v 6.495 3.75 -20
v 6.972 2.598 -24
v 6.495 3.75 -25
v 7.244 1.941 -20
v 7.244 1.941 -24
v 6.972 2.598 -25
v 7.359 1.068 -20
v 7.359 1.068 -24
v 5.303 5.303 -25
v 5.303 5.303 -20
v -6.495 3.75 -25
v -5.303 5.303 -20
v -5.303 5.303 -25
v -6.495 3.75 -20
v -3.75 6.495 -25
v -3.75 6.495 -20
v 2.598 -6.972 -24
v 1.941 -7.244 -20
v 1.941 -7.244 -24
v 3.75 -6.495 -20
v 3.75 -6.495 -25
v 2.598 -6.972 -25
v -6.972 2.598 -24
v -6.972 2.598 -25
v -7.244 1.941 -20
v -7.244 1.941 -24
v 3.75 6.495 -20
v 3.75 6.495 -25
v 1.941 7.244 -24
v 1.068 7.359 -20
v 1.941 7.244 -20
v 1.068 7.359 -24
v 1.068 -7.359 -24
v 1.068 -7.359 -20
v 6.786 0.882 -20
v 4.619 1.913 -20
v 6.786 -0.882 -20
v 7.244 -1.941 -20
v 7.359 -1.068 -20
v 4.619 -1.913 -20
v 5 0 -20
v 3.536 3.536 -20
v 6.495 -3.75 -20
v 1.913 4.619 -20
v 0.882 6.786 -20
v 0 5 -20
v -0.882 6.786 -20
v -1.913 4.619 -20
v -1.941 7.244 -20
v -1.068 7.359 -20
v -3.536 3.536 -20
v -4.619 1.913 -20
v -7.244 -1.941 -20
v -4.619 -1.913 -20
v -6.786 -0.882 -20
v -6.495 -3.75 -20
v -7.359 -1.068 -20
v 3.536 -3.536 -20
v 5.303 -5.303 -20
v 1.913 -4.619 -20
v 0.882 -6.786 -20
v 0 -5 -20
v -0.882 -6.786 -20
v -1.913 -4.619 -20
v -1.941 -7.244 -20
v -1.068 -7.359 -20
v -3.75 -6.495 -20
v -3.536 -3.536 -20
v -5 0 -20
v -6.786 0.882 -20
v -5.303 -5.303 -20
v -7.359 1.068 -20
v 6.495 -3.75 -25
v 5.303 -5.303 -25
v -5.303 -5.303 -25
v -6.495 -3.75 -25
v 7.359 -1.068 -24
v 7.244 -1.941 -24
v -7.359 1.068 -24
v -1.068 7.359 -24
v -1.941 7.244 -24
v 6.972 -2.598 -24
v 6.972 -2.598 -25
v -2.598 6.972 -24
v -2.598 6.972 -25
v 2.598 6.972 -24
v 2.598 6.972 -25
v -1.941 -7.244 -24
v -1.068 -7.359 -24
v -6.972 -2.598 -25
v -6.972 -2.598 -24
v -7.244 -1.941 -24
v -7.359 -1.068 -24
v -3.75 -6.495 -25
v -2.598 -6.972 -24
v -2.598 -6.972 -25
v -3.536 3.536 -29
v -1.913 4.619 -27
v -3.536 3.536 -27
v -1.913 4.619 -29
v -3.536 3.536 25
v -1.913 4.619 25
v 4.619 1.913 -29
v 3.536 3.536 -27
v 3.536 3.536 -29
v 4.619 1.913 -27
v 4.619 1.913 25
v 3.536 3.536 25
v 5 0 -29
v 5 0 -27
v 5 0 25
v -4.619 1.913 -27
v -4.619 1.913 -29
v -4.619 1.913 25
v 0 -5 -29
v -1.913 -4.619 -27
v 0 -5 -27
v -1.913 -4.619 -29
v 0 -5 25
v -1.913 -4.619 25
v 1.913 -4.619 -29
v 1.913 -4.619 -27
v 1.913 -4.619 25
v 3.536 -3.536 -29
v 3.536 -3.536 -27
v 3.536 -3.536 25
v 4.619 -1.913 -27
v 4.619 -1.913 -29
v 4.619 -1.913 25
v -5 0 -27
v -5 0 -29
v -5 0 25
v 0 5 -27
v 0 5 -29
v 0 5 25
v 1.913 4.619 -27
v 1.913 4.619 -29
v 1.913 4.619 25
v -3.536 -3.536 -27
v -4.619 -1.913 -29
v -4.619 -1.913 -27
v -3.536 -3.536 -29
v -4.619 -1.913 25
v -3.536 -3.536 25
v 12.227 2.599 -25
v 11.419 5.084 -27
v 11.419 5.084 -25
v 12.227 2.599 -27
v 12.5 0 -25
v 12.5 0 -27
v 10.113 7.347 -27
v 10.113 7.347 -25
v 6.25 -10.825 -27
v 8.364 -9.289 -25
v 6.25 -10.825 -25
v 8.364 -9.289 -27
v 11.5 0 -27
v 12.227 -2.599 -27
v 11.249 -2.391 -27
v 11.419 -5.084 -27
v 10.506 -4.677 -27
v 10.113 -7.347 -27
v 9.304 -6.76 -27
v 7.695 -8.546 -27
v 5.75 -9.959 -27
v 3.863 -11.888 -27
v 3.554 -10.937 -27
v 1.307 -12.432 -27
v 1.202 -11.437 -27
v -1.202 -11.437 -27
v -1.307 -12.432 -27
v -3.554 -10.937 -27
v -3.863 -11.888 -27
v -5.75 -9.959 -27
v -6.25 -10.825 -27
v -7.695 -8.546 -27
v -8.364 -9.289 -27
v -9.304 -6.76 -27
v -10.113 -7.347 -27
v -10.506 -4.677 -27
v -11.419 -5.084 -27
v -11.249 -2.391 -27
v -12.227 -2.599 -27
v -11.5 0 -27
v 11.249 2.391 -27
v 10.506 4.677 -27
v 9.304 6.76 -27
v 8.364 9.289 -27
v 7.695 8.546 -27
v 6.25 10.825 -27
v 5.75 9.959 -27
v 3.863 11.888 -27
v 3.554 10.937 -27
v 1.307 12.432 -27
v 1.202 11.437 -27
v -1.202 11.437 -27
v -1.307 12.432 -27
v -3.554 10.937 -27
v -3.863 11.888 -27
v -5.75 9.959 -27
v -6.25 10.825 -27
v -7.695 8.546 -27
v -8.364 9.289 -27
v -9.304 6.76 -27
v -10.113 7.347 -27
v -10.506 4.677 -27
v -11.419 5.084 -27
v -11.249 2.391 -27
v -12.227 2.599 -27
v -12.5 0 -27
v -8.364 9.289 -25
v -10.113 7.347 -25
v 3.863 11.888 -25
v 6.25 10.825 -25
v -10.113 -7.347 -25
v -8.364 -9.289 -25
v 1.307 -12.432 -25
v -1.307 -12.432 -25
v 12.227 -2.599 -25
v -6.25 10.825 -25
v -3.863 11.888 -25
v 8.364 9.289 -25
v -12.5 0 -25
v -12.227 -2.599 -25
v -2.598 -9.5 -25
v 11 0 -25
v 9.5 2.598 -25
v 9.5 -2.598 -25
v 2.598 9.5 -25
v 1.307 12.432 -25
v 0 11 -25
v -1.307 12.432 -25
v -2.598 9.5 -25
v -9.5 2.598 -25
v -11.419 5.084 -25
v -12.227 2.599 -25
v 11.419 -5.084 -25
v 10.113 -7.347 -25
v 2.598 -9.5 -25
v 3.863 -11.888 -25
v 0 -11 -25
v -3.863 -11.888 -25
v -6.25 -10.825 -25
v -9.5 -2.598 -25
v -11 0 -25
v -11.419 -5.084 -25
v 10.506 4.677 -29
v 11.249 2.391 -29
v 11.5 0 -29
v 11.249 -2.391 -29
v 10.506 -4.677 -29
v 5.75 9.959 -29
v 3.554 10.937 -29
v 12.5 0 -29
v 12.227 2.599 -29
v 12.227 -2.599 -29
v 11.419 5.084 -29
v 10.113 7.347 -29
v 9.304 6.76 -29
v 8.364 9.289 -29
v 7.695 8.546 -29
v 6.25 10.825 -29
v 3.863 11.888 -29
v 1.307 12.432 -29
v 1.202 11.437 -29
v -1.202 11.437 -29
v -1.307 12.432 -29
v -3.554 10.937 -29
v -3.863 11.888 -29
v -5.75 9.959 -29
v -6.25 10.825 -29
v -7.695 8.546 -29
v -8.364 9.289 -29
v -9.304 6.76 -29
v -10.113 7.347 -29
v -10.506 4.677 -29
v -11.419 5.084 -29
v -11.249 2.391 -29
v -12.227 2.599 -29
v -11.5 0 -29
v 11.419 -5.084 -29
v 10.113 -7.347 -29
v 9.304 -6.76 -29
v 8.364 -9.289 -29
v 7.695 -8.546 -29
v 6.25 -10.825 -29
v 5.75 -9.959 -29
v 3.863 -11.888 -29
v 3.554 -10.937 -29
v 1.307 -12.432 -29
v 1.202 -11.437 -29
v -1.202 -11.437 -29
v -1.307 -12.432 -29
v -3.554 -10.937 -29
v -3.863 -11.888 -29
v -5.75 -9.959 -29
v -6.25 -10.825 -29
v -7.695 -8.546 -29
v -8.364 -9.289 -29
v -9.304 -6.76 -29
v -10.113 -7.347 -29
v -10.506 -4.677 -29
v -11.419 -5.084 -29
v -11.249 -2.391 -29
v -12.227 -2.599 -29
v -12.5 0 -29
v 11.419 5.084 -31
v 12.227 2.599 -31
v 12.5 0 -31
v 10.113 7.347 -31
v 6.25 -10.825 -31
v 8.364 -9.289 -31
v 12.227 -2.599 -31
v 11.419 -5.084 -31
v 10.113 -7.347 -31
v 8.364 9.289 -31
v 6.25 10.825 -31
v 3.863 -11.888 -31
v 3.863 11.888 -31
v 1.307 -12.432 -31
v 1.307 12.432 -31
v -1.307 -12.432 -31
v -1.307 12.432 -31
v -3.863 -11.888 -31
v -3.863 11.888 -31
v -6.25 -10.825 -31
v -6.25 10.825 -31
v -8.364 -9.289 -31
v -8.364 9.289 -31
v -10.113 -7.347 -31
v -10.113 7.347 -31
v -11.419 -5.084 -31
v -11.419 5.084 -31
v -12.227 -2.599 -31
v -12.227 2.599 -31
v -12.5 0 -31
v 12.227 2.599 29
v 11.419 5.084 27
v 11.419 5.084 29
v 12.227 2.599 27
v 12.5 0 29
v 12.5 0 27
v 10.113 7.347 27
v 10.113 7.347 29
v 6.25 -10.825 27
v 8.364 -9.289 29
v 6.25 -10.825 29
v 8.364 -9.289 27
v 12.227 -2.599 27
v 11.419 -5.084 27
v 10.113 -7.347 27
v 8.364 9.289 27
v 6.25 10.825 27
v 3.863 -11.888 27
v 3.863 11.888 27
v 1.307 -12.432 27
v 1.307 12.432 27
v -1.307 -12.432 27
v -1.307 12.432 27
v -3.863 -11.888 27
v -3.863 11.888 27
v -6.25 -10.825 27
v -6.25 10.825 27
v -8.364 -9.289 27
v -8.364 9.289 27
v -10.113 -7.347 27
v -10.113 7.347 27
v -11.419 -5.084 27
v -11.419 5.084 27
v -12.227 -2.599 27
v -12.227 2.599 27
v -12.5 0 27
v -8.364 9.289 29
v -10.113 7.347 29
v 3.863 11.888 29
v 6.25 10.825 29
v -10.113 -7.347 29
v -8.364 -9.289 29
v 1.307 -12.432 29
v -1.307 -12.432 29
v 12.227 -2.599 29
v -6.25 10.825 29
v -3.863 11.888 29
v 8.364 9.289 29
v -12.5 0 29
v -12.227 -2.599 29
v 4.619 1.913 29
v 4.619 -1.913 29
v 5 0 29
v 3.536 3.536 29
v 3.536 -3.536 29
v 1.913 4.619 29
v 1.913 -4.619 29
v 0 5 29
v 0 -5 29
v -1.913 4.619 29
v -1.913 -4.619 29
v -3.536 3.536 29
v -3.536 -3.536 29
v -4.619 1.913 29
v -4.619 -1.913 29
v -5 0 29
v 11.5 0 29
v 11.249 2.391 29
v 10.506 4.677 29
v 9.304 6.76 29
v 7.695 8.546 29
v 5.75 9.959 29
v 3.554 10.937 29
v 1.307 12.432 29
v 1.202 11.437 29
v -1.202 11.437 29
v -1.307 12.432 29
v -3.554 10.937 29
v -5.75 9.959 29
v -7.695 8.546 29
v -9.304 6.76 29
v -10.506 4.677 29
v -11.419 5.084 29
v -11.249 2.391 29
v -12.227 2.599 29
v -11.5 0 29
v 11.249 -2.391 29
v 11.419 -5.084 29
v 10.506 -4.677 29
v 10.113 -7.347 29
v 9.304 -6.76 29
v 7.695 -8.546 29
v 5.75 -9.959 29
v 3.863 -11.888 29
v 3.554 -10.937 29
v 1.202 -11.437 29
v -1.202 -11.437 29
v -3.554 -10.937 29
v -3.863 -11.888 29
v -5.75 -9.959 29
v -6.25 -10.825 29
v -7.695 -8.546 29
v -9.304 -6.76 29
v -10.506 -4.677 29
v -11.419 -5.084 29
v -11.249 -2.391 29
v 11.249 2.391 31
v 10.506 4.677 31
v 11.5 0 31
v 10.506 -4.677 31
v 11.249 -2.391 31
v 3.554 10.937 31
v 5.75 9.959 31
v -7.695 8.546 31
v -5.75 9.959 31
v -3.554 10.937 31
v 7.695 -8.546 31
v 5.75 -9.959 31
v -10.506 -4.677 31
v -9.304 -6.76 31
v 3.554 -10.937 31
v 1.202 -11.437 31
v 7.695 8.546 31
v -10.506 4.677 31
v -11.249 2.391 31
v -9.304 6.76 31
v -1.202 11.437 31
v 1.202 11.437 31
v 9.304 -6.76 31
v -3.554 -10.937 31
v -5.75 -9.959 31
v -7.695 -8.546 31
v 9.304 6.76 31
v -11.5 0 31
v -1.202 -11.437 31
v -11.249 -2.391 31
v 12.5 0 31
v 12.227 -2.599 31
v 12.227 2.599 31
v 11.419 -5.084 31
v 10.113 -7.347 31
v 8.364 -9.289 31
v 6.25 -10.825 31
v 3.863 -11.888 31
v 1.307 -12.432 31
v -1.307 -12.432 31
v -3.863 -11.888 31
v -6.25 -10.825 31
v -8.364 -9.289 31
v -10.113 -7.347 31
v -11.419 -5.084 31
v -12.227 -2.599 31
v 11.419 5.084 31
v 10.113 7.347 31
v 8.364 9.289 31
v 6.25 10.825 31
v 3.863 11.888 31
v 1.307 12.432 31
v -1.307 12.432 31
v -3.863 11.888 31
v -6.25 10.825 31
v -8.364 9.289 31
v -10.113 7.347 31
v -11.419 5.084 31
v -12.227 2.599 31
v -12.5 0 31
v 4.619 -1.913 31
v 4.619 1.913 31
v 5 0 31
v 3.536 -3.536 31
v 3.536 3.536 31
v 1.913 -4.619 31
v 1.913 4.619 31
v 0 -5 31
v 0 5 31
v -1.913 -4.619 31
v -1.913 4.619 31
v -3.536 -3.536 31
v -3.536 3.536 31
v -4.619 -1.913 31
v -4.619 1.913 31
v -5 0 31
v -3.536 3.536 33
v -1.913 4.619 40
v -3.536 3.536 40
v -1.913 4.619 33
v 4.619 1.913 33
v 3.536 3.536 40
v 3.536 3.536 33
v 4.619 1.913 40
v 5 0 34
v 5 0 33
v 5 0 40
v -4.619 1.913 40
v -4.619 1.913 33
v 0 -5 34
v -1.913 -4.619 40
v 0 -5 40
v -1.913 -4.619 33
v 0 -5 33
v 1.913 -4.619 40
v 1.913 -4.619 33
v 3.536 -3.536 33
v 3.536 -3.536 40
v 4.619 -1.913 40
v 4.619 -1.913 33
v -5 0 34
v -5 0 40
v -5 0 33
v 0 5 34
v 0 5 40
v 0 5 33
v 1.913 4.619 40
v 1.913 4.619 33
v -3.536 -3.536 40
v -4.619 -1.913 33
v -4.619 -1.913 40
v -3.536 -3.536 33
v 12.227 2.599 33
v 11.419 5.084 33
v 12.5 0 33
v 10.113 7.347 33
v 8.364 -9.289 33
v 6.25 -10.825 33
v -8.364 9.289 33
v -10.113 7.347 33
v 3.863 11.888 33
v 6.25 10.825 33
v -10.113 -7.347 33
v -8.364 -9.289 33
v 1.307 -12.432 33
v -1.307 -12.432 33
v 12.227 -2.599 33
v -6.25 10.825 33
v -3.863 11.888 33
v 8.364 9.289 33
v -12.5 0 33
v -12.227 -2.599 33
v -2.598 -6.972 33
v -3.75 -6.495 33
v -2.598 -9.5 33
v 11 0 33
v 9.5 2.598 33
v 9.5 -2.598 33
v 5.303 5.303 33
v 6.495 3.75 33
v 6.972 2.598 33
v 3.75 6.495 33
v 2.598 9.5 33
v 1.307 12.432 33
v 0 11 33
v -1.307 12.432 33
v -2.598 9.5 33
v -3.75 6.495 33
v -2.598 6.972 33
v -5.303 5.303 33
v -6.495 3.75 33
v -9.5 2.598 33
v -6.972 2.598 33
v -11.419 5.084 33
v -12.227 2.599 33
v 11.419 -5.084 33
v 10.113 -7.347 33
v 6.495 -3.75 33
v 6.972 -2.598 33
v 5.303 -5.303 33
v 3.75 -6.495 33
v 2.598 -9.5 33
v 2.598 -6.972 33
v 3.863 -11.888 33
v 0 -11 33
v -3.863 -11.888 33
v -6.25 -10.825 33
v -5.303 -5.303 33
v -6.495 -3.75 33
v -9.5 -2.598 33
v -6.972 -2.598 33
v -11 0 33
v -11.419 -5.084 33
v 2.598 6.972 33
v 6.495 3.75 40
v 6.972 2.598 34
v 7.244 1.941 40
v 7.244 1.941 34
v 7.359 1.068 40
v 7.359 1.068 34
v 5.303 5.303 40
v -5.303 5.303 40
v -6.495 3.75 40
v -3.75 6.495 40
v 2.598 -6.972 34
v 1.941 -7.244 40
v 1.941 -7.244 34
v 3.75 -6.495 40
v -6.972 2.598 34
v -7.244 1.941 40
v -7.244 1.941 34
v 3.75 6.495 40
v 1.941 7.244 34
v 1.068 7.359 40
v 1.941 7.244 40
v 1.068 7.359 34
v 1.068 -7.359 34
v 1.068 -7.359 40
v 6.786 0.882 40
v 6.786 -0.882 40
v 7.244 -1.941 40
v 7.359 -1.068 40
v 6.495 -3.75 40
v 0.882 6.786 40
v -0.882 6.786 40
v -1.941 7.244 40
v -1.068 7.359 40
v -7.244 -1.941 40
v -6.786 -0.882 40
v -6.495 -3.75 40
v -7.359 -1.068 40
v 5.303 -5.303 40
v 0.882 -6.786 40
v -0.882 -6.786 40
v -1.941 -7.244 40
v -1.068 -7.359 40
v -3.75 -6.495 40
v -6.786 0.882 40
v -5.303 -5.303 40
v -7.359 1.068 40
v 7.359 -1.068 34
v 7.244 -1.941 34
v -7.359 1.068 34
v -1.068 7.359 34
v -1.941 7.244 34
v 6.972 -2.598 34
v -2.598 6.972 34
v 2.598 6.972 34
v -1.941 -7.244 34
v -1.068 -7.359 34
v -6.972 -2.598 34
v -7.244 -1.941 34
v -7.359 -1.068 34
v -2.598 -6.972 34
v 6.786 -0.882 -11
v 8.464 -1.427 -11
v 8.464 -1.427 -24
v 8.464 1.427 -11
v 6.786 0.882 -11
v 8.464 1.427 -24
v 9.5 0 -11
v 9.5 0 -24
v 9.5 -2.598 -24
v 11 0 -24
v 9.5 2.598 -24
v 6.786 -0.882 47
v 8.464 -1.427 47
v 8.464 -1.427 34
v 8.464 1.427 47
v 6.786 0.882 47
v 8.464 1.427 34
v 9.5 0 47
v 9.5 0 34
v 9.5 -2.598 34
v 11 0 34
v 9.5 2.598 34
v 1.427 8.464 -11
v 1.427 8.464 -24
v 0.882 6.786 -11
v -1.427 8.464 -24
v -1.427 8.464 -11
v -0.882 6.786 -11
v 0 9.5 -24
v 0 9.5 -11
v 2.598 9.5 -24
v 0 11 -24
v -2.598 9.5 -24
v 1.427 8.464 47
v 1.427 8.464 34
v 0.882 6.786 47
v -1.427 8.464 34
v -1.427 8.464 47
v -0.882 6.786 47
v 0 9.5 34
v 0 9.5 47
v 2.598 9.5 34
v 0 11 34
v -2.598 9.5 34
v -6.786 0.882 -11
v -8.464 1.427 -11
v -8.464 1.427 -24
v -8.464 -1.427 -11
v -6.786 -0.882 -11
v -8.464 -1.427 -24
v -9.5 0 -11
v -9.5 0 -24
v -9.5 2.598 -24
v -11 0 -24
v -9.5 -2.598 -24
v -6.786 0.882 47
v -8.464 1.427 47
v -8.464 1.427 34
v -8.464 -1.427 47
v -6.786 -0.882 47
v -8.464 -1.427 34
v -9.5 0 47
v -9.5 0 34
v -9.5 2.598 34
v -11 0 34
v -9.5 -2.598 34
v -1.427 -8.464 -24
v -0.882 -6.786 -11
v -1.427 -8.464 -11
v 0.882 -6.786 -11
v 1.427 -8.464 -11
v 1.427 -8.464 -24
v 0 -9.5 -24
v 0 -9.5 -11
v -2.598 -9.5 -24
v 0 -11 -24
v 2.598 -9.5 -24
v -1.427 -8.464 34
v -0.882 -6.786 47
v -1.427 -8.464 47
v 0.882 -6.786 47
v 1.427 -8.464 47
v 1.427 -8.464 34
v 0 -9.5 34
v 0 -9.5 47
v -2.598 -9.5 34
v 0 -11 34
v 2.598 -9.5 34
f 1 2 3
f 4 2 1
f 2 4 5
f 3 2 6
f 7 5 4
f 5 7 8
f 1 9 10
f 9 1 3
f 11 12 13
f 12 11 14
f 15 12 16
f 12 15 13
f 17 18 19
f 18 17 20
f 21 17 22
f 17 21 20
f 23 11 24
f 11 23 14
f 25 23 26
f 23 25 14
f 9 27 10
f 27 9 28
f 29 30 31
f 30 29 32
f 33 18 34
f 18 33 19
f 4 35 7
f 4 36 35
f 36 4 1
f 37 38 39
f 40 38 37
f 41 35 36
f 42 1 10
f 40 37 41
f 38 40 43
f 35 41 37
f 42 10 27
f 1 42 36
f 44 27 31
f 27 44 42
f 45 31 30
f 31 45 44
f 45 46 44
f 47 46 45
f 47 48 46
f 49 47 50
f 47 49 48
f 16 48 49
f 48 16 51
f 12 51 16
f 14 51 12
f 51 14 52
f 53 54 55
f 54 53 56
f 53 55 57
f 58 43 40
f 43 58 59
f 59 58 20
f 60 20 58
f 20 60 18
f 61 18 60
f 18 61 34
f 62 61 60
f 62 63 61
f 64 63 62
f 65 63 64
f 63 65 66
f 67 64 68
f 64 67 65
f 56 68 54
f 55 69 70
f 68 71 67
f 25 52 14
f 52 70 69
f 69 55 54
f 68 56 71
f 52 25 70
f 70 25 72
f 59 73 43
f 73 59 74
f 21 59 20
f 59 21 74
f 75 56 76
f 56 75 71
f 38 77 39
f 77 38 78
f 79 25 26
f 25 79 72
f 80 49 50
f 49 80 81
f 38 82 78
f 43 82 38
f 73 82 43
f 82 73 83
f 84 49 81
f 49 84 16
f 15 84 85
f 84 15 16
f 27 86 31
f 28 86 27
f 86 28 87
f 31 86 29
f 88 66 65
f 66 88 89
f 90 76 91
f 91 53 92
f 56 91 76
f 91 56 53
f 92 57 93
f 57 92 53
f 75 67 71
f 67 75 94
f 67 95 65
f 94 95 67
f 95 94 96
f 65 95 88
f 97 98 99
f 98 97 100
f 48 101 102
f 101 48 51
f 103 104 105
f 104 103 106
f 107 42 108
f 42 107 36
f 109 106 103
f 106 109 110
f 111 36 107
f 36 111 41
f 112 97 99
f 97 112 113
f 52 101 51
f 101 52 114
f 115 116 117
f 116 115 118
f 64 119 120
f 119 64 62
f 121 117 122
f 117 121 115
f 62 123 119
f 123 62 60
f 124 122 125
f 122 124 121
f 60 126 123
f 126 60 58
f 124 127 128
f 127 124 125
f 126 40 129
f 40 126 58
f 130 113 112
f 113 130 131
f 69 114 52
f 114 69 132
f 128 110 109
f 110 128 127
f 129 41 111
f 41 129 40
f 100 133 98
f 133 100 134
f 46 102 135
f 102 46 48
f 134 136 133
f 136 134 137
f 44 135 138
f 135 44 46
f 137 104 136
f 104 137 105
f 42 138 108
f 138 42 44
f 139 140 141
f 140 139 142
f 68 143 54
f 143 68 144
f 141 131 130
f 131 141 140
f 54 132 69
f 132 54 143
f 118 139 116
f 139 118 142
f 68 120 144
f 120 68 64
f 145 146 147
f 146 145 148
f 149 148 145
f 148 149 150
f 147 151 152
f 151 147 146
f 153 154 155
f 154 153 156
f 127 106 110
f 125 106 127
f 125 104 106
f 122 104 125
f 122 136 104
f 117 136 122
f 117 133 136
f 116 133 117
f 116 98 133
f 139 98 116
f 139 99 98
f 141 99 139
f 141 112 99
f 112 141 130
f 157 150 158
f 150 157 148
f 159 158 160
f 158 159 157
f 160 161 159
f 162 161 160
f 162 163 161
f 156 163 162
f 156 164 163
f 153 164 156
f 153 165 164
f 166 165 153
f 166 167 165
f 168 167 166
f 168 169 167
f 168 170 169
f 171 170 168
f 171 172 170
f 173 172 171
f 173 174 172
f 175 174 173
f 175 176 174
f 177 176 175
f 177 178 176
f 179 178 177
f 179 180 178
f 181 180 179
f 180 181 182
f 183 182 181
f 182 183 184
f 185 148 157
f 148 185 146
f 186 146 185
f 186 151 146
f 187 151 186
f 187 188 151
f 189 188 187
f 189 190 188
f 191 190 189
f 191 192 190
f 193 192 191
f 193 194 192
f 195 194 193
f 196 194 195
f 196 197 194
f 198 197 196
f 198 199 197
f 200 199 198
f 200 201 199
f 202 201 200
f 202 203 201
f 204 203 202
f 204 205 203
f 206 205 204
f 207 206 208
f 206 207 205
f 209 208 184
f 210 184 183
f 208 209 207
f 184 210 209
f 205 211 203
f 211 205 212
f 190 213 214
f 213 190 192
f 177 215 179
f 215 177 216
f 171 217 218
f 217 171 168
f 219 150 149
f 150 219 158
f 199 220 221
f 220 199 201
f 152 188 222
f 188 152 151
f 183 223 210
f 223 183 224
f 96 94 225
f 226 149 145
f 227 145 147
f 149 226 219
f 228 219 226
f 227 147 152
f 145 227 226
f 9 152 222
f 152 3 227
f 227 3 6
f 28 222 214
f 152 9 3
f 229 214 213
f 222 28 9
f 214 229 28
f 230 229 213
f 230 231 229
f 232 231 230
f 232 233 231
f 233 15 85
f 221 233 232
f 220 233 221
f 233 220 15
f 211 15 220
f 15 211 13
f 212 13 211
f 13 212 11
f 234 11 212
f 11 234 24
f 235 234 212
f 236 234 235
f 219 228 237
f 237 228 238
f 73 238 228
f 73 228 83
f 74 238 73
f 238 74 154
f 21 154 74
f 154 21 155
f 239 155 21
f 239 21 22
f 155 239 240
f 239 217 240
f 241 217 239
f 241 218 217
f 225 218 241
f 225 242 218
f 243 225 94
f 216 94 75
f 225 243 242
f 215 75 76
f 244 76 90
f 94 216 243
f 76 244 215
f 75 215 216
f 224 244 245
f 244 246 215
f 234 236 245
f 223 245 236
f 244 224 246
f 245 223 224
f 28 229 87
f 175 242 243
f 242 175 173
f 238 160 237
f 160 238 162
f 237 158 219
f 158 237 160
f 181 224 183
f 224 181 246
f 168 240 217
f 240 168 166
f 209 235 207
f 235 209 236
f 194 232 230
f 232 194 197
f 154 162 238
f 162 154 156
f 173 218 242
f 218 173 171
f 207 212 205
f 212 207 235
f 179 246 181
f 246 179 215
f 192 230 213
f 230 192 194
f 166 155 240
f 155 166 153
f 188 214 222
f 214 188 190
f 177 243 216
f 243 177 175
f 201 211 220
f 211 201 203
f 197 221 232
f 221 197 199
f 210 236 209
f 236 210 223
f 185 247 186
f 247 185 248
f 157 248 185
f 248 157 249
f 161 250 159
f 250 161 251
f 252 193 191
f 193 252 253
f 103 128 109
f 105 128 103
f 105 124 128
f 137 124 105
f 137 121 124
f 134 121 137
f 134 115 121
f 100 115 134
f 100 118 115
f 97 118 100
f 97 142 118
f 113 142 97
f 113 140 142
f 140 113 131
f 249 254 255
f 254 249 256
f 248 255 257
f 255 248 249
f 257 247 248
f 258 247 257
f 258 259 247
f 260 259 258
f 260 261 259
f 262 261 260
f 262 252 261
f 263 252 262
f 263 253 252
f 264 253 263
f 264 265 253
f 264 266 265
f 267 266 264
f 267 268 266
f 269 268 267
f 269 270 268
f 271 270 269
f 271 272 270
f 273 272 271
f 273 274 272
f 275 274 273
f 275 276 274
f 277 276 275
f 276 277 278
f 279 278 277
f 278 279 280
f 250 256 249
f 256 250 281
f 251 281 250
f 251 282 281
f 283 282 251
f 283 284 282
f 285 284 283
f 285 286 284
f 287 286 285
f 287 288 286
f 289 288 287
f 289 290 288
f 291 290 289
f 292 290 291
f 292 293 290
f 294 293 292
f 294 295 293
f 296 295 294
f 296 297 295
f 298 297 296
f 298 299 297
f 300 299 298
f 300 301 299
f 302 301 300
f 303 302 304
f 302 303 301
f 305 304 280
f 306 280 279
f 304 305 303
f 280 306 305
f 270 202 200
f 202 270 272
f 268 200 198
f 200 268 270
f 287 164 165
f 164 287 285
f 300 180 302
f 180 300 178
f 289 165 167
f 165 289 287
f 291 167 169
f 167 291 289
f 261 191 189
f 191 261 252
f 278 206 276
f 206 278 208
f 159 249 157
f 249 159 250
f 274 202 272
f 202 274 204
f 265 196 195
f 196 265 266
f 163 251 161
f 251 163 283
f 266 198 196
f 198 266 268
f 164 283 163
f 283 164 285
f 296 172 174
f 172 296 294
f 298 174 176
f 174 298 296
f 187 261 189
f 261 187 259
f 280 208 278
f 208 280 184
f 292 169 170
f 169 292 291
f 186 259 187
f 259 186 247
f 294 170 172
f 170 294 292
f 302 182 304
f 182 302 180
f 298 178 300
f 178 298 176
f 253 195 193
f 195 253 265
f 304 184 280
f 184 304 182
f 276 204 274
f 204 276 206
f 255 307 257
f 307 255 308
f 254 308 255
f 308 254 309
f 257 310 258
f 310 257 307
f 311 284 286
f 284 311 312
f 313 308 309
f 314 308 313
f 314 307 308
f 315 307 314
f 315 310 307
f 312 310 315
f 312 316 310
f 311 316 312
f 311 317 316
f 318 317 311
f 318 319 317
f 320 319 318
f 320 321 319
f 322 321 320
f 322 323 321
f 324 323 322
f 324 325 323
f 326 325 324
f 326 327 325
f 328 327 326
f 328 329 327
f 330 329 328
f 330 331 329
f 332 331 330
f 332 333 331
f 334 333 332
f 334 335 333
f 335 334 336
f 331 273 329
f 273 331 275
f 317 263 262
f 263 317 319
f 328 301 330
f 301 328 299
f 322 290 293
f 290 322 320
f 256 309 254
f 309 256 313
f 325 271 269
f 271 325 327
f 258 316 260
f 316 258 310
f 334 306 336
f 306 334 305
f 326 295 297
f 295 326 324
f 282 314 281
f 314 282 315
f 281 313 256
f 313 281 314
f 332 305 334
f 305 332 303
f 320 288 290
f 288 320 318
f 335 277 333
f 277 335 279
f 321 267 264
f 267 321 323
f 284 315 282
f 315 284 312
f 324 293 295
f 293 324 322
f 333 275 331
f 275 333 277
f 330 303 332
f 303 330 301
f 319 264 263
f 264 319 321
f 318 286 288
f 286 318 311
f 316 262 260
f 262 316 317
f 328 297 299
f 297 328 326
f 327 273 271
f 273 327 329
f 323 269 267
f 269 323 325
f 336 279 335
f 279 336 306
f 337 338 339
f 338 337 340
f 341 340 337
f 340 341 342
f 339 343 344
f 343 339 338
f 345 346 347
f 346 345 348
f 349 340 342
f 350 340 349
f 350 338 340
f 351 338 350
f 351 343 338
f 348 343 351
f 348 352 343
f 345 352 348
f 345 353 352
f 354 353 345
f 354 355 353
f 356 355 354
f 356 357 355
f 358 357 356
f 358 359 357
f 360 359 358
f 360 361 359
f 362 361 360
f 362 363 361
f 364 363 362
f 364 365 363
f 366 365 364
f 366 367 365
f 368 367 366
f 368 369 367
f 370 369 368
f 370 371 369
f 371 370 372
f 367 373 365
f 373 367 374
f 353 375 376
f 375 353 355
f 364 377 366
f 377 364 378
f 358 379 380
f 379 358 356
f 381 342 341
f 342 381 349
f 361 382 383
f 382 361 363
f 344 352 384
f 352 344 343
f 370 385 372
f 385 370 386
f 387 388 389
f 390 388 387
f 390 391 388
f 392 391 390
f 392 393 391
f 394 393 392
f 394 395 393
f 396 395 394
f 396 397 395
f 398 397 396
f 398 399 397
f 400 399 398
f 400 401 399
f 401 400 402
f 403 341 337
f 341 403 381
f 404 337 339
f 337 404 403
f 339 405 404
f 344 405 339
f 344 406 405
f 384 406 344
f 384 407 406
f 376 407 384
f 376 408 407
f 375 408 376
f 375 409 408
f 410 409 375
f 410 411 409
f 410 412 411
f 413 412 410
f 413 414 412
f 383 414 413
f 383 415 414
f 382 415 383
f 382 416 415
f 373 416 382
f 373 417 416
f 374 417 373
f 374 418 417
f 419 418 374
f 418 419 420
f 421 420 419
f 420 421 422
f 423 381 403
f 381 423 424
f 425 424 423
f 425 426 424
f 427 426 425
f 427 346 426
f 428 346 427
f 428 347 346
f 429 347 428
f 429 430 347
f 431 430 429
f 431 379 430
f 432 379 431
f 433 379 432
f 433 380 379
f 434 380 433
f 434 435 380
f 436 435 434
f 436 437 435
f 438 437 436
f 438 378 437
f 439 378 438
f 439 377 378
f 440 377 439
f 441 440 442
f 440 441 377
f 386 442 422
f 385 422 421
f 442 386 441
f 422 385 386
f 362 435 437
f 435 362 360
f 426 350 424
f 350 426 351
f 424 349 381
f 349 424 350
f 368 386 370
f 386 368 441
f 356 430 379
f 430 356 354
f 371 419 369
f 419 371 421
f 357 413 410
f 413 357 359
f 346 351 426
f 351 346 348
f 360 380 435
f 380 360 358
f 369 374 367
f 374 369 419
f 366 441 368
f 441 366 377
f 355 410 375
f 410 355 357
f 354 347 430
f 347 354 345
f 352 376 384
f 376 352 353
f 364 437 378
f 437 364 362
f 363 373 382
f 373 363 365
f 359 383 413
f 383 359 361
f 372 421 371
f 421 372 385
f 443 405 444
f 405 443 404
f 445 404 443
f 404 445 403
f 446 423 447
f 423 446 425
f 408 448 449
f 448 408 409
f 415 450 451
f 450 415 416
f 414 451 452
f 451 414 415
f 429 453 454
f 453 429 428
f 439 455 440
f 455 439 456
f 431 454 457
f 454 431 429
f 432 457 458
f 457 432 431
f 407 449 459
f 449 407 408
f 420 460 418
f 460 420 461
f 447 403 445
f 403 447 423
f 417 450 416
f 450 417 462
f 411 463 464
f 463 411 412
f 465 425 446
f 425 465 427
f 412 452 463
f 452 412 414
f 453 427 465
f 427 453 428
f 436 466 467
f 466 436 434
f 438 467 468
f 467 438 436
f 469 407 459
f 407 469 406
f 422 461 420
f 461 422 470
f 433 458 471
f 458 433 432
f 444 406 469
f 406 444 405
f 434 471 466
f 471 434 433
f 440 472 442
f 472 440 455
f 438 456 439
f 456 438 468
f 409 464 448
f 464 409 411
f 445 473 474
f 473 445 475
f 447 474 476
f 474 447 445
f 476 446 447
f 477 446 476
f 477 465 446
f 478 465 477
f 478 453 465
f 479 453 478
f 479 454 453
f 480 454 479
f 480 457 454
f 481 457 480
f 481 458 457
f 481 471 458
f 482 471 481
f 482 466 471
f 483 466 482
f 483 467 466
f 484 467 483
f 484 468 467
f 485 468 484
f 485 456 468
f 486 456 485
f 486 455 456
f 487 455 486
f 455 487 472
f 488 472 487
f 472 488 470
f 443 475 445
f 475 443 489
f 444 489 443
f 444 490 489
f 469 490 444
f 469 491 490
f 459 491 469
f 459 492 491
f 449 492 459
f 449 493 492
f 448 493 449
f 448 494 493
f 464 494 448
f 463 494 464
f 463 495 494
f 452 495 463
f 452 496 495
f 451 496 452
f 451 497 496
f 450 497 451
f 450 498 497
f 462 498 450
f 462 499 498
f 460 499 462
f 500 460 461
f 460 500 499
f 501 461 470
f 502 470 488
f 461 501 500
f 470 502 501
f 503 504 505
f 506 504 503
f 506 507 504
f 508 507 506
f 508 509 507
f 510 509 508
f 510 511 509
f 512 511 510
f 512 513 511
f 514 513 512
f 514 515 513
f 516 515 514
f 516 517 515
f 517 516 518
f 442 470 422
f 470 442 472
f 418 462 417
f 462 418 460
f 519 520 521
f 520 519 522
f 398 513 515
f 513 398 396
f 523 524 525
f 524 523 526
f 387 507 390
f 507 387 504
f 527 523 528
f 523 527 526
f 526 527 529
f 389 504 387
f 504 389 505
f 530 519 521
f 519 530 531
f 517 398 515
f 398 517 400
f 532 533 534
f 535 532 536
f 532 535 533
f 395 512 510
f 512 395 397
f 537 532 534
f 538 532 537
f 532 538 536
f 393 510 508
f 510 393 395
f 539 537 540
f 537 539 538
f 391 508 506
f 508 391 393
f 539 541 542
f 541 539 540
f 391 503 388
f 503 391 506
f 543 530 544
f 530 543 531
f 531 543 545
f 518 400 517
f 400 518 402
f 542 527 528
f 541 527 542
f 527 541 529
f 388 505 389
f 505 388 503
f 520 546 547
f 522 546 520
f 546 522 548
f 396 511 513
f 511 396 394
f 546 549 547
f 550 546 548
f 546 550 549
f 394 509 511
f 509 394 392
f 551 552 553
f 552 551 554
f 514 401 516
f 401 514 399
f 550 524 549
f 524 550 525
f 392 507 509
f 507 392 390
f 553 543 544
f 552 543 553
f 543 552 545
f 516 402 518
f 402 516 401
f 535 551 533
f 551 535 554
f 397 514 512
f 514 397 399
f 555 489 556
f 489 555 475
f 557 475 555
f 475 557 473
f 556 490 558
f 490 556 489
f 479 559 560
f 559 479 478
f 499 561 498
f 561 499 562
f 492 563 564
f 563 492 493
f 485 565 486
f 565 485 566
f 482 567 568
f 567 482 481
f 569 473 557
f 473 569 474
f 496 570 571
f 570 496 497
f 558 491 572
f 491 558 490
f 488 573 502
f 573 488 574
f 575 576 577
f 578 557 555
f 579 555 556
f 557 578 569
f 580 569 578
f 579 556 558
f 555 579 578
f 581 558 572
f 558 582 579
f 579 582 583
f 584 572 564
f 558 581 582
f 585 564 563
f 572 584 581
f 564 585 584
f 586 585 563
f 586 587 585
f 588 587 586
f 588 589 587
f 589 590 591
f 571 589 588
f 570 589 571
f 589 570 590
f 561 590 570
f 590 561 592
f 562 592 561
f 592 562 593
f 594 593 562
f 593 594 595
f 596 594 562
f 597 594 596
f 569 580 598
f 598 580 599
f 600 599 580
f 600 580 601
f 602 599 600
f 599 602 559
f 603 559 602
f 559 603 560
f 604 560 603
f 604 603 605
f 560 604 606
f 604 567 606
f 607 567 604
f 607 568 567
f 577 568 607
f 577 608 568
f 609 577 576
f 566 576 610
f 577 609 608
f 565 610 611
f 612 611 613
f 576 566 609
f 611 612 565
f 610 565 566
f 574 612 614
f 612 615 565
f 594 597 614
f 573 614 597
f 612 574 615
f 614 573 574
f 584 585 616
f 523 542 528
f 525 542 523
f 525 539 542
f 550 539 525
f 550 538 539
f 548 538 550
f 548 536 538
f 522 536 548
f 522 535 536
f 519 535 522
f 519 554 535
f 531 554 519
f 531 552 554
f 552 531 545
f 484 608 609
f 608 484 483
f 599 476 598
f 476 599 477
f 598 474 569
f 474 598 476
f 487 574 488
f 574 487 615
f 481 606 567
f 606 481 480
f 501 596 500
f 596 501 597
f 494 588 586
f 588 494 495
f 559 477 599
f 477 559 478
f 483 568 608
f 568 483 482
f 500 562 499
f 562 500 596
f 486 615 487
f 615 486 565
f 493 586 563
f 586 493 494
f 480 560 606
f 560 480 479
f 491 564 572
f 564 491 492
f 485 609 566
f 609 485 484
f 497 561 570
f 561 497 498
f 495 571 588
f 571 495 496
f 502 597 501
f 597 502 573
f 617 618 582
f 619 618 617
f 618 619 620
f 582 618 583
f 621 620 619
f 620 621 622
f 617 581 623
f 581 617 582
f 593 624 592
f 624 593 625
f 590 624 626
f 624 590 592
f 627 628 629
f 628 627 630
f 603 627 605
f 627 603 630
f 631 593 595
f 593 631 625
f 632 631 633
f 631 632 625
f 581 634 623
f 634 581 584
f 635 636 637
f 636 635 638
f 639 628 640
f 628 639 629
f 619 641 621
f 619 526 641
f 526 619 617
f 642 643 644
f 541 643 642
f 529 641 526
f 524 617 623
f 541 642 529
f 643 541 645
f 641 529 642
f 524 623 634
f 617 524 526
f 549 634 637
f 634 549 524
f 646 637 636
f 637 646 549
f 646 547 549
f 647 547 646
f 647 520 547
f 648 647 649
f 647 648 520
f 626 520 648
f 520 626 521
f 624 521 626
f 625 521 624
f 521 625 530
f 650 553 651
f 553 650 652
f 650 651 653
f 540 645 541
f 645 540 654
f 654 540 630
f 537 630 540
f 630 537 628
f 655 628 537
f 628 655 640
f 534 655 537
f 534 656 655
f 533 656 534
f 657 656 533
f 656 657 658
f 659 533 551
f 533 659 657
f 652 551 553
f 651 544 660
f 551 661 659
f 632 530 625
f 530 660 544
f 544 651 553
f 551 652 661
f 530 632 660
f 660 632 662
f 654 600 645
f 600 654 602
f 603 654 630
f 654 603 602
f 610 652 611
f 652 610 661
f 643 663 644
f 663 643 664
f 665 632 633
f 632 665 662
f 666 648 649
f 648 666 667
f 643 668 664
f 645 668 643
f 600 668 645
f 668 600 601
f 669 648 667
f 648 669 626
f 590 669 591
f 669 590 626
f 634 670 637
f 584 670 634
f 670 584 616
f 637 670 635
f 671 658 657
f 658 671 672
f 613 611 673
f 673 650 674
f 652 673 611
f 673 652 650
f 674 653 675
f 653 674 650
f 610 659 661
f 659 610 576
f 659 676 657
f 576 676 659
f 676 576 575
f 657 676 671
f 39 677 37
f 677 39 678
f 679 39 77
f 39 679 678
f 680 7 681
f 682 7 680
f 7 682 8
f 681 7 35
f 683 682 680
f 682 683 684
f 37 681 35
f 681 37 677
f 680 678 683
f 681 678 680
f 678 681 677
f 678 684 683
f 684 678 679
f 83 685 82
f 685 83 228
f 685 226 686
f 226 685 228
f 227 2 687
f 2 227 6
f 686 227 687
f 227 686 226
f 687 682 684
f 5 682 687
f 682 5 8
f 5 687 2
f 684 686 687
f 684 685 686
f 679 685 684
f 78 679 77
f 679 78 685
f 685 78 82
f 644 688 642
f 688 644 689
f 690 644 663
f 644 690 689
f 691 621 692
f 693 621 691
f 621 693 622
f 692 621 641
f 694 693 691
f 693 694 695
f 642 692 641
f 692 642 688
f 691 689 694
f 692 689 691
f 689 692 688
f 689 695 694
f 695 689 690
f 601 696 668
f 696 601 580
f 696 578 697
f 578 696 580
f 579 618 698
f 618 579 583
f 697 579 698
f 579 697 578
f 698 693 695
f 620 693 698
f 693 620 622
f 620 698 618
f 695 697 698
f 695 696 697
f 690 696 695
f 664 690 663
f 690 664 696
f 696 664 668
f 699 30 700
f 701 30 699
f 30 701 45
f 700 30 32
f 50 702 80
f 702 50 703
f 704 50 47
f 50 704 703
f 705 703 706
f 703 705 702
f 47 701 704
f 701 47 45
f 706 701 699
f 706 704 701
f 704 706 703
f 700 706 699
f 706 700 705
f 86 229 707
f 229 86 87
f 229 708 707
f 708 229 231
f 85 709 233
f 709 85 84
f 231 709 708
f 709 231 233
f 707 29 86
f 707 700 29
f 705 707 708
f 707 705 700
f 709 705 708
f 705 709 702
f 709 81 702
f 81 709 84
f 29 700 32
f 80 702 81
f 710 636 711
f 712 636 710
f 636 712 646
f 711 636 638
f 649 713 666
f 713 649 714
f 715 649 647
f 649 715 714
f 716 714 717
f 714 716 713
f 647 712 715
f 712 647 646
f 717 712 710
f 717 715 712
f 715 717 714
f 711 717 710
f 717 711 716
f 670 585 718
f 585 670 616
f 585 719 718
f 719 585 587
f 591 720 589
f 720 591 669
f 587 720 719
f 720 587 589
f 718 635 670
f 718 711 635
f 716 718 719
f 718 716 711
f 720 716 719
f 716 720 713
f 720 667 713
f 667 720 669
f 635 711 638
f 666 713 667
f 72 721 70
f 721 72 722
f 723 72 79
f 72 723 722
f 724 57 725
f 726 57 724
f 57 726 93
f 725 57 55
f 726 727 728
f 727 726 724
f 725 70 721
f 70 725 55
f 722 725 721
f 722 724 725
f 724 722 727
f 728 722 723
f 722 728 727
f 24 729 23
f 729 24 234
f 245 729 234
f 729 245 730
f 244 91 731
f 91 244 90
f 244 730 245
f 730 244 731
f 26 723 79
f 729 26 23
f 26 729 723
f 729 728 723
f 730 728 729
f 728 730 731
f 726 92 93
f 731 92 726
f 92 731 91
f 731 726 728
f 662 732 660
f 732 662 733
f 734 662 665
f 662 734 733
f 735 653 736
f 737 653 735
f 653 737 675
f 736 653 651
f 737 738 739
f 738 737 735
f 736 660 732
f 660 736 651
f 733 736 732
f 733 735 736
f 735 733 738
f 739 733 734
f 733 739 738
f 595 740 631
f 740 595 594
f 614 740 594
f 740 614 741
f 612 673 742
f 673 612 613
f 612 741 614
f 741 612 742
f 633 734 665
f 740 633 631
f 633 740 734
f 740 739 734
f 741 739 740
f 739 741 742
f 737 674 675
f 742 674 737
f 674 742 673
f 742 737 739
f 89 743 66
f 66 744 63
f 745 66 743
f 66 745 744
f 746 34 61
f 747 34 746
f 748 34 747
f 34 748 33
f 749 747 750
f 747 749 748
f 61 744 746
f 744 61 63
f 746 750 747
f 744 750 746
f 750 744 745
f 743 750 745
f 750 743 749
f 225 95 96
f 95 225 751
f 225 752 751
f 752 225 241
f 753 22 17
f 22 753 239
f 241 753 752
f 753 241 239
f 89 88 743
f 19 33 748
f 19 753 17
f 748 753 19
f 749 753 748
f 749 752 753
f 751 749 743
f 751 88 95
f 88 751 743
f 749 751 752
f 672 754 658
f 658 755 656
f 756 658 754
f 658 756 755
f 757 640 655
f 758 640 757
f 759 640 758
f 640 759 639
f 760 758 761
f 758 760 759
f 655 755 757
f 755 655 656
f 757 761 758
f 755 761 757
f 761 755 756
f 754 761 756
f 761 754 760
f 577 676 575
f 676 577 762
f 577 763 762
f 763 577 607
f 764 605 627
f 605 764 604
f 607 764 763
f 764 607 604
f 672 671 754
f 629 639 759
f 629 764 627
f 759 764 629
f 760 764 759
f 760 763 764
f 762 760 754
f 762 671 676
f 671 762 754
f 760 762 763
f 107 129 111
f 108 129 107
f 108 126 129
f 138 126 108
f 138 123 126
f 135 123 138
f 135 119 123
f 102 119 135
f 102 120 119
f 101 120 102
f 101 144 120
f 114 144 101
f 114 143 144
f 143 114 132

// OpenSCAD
// Parameters
shaft_length = 50;
shaft_diameter = 10;
hub_diameter = 15; // Reduced to match the original model
hub_length = 10; // Reduced to match the original model
flange_diameter = 25; // Adjusted to match the original model
flange_thickness = 2; // Reduced to match the original model
spacer_diameter = 23; // Adjusted to match the original model
spacer_thickness = 2;
bolt_diameter = 3;
bolt_length = 20;
nut_diameter = 6;
nut_thickness = 3;
bolt_hole_radius = 8; // Adjusted to match the original model

// Function to create a hub
module hub() {
    difference() {
        cylinder(h = hub_length, d = hub_diameter);
        translate([0, 0, -1]) cylinder(h = hub_length + 2, d = shaft_diameter);
    }
}

// Function to create a flange plate
module flange_plate() {
    difference() {
        cylinder(h = flange_thickness, d = flange_diameter);
        for (i = [0:90:270]) {
            rotate([0, 0, i])
            translate([bolt_hole_radius, 0, -1])
            cylinder(h = flange_thickness + 2, d = bolt_diameter);
        }
    }
}

// Function to create a spacer ring
module spacer_ring() {
    difference() {
        cylinder(h = spacer_thickness, d = spacer_diameter);
        translate([0, 0, -1]) cylinder(h = spacer_thickness + 2, d = shaft_diameter);
    }
}

// Function to create a bolt
module bolt() {
    cylinder(h = bolt_length, d = bolt_diameter);
}

// Function to create a nut
module nut() {
    cylinder(h = nut_thickness, d = nut_diameter, $fn=6);
}

// Assembly
module coupling() {
    // End hub 1
    translate([0, 0, -shaft_length/2 - hub_length/2]) hub();
    
    // Flange plate 1
    translate([0, 0, -shaft_length/2 - flange_thickness]) flange_plate();
    
    // Spacer ring 1
    translate([0, 0, -shaft_length/2 - flange_thickness - spacer_thickness]) spacer_ring();
    
    // Flange plate 2
    translate([0, 0, -shaft_length/2 - flange_thickness - spacer_thickness - flange_thickness]) flange_plate();
    
    // Central shaft (added to match the original model)
    translate([0, 0, -shaft_length/2]) cylinder(h = shaft_length, d = shaft_diameter);
    
    // Flange plate 3
    translate([0, 0, shaft_length/2 + flange_thickness]) flange_plate();
    
    // Spacer ring 2
    translate([0, 0, shaft_length/2 + flange_thickness + spacer_thickness]) spacer_ring();
    
    // Flange plate 4
    translate([0, 0, shaft_length/2 + flange_thickness + spacer_thickness + flange_thickness]) flange_plate();
    
    // End hub 2
    translate([0, 0, shaft_length/2 + hub_length/2]) hub();
    
    // Bolts and nuts (added to match the original model)
    for (i = [0:90:270]) {
        rotate([0, 0, i]) {
            translate([bolt_hole_radius, 0, -shaft_length/2 - flange_thickness - spacer_thickness - flange_thickness])
            bolt();
            
            translate([bolt_hole_radius, 0, -shaft_length/2 - flange_thickness])
            nut();
            
            translate([bolt_hole_radius, 0, shaft_length/2 + flange_thickness])
            bolt();
            
            translate([bolt_hole_radius, 0, shaft_length/2 + flange_thickness + spacer_thickness + flange_thickness])
            nut();
        }
    }
}

// Render the coupling
coupling();
